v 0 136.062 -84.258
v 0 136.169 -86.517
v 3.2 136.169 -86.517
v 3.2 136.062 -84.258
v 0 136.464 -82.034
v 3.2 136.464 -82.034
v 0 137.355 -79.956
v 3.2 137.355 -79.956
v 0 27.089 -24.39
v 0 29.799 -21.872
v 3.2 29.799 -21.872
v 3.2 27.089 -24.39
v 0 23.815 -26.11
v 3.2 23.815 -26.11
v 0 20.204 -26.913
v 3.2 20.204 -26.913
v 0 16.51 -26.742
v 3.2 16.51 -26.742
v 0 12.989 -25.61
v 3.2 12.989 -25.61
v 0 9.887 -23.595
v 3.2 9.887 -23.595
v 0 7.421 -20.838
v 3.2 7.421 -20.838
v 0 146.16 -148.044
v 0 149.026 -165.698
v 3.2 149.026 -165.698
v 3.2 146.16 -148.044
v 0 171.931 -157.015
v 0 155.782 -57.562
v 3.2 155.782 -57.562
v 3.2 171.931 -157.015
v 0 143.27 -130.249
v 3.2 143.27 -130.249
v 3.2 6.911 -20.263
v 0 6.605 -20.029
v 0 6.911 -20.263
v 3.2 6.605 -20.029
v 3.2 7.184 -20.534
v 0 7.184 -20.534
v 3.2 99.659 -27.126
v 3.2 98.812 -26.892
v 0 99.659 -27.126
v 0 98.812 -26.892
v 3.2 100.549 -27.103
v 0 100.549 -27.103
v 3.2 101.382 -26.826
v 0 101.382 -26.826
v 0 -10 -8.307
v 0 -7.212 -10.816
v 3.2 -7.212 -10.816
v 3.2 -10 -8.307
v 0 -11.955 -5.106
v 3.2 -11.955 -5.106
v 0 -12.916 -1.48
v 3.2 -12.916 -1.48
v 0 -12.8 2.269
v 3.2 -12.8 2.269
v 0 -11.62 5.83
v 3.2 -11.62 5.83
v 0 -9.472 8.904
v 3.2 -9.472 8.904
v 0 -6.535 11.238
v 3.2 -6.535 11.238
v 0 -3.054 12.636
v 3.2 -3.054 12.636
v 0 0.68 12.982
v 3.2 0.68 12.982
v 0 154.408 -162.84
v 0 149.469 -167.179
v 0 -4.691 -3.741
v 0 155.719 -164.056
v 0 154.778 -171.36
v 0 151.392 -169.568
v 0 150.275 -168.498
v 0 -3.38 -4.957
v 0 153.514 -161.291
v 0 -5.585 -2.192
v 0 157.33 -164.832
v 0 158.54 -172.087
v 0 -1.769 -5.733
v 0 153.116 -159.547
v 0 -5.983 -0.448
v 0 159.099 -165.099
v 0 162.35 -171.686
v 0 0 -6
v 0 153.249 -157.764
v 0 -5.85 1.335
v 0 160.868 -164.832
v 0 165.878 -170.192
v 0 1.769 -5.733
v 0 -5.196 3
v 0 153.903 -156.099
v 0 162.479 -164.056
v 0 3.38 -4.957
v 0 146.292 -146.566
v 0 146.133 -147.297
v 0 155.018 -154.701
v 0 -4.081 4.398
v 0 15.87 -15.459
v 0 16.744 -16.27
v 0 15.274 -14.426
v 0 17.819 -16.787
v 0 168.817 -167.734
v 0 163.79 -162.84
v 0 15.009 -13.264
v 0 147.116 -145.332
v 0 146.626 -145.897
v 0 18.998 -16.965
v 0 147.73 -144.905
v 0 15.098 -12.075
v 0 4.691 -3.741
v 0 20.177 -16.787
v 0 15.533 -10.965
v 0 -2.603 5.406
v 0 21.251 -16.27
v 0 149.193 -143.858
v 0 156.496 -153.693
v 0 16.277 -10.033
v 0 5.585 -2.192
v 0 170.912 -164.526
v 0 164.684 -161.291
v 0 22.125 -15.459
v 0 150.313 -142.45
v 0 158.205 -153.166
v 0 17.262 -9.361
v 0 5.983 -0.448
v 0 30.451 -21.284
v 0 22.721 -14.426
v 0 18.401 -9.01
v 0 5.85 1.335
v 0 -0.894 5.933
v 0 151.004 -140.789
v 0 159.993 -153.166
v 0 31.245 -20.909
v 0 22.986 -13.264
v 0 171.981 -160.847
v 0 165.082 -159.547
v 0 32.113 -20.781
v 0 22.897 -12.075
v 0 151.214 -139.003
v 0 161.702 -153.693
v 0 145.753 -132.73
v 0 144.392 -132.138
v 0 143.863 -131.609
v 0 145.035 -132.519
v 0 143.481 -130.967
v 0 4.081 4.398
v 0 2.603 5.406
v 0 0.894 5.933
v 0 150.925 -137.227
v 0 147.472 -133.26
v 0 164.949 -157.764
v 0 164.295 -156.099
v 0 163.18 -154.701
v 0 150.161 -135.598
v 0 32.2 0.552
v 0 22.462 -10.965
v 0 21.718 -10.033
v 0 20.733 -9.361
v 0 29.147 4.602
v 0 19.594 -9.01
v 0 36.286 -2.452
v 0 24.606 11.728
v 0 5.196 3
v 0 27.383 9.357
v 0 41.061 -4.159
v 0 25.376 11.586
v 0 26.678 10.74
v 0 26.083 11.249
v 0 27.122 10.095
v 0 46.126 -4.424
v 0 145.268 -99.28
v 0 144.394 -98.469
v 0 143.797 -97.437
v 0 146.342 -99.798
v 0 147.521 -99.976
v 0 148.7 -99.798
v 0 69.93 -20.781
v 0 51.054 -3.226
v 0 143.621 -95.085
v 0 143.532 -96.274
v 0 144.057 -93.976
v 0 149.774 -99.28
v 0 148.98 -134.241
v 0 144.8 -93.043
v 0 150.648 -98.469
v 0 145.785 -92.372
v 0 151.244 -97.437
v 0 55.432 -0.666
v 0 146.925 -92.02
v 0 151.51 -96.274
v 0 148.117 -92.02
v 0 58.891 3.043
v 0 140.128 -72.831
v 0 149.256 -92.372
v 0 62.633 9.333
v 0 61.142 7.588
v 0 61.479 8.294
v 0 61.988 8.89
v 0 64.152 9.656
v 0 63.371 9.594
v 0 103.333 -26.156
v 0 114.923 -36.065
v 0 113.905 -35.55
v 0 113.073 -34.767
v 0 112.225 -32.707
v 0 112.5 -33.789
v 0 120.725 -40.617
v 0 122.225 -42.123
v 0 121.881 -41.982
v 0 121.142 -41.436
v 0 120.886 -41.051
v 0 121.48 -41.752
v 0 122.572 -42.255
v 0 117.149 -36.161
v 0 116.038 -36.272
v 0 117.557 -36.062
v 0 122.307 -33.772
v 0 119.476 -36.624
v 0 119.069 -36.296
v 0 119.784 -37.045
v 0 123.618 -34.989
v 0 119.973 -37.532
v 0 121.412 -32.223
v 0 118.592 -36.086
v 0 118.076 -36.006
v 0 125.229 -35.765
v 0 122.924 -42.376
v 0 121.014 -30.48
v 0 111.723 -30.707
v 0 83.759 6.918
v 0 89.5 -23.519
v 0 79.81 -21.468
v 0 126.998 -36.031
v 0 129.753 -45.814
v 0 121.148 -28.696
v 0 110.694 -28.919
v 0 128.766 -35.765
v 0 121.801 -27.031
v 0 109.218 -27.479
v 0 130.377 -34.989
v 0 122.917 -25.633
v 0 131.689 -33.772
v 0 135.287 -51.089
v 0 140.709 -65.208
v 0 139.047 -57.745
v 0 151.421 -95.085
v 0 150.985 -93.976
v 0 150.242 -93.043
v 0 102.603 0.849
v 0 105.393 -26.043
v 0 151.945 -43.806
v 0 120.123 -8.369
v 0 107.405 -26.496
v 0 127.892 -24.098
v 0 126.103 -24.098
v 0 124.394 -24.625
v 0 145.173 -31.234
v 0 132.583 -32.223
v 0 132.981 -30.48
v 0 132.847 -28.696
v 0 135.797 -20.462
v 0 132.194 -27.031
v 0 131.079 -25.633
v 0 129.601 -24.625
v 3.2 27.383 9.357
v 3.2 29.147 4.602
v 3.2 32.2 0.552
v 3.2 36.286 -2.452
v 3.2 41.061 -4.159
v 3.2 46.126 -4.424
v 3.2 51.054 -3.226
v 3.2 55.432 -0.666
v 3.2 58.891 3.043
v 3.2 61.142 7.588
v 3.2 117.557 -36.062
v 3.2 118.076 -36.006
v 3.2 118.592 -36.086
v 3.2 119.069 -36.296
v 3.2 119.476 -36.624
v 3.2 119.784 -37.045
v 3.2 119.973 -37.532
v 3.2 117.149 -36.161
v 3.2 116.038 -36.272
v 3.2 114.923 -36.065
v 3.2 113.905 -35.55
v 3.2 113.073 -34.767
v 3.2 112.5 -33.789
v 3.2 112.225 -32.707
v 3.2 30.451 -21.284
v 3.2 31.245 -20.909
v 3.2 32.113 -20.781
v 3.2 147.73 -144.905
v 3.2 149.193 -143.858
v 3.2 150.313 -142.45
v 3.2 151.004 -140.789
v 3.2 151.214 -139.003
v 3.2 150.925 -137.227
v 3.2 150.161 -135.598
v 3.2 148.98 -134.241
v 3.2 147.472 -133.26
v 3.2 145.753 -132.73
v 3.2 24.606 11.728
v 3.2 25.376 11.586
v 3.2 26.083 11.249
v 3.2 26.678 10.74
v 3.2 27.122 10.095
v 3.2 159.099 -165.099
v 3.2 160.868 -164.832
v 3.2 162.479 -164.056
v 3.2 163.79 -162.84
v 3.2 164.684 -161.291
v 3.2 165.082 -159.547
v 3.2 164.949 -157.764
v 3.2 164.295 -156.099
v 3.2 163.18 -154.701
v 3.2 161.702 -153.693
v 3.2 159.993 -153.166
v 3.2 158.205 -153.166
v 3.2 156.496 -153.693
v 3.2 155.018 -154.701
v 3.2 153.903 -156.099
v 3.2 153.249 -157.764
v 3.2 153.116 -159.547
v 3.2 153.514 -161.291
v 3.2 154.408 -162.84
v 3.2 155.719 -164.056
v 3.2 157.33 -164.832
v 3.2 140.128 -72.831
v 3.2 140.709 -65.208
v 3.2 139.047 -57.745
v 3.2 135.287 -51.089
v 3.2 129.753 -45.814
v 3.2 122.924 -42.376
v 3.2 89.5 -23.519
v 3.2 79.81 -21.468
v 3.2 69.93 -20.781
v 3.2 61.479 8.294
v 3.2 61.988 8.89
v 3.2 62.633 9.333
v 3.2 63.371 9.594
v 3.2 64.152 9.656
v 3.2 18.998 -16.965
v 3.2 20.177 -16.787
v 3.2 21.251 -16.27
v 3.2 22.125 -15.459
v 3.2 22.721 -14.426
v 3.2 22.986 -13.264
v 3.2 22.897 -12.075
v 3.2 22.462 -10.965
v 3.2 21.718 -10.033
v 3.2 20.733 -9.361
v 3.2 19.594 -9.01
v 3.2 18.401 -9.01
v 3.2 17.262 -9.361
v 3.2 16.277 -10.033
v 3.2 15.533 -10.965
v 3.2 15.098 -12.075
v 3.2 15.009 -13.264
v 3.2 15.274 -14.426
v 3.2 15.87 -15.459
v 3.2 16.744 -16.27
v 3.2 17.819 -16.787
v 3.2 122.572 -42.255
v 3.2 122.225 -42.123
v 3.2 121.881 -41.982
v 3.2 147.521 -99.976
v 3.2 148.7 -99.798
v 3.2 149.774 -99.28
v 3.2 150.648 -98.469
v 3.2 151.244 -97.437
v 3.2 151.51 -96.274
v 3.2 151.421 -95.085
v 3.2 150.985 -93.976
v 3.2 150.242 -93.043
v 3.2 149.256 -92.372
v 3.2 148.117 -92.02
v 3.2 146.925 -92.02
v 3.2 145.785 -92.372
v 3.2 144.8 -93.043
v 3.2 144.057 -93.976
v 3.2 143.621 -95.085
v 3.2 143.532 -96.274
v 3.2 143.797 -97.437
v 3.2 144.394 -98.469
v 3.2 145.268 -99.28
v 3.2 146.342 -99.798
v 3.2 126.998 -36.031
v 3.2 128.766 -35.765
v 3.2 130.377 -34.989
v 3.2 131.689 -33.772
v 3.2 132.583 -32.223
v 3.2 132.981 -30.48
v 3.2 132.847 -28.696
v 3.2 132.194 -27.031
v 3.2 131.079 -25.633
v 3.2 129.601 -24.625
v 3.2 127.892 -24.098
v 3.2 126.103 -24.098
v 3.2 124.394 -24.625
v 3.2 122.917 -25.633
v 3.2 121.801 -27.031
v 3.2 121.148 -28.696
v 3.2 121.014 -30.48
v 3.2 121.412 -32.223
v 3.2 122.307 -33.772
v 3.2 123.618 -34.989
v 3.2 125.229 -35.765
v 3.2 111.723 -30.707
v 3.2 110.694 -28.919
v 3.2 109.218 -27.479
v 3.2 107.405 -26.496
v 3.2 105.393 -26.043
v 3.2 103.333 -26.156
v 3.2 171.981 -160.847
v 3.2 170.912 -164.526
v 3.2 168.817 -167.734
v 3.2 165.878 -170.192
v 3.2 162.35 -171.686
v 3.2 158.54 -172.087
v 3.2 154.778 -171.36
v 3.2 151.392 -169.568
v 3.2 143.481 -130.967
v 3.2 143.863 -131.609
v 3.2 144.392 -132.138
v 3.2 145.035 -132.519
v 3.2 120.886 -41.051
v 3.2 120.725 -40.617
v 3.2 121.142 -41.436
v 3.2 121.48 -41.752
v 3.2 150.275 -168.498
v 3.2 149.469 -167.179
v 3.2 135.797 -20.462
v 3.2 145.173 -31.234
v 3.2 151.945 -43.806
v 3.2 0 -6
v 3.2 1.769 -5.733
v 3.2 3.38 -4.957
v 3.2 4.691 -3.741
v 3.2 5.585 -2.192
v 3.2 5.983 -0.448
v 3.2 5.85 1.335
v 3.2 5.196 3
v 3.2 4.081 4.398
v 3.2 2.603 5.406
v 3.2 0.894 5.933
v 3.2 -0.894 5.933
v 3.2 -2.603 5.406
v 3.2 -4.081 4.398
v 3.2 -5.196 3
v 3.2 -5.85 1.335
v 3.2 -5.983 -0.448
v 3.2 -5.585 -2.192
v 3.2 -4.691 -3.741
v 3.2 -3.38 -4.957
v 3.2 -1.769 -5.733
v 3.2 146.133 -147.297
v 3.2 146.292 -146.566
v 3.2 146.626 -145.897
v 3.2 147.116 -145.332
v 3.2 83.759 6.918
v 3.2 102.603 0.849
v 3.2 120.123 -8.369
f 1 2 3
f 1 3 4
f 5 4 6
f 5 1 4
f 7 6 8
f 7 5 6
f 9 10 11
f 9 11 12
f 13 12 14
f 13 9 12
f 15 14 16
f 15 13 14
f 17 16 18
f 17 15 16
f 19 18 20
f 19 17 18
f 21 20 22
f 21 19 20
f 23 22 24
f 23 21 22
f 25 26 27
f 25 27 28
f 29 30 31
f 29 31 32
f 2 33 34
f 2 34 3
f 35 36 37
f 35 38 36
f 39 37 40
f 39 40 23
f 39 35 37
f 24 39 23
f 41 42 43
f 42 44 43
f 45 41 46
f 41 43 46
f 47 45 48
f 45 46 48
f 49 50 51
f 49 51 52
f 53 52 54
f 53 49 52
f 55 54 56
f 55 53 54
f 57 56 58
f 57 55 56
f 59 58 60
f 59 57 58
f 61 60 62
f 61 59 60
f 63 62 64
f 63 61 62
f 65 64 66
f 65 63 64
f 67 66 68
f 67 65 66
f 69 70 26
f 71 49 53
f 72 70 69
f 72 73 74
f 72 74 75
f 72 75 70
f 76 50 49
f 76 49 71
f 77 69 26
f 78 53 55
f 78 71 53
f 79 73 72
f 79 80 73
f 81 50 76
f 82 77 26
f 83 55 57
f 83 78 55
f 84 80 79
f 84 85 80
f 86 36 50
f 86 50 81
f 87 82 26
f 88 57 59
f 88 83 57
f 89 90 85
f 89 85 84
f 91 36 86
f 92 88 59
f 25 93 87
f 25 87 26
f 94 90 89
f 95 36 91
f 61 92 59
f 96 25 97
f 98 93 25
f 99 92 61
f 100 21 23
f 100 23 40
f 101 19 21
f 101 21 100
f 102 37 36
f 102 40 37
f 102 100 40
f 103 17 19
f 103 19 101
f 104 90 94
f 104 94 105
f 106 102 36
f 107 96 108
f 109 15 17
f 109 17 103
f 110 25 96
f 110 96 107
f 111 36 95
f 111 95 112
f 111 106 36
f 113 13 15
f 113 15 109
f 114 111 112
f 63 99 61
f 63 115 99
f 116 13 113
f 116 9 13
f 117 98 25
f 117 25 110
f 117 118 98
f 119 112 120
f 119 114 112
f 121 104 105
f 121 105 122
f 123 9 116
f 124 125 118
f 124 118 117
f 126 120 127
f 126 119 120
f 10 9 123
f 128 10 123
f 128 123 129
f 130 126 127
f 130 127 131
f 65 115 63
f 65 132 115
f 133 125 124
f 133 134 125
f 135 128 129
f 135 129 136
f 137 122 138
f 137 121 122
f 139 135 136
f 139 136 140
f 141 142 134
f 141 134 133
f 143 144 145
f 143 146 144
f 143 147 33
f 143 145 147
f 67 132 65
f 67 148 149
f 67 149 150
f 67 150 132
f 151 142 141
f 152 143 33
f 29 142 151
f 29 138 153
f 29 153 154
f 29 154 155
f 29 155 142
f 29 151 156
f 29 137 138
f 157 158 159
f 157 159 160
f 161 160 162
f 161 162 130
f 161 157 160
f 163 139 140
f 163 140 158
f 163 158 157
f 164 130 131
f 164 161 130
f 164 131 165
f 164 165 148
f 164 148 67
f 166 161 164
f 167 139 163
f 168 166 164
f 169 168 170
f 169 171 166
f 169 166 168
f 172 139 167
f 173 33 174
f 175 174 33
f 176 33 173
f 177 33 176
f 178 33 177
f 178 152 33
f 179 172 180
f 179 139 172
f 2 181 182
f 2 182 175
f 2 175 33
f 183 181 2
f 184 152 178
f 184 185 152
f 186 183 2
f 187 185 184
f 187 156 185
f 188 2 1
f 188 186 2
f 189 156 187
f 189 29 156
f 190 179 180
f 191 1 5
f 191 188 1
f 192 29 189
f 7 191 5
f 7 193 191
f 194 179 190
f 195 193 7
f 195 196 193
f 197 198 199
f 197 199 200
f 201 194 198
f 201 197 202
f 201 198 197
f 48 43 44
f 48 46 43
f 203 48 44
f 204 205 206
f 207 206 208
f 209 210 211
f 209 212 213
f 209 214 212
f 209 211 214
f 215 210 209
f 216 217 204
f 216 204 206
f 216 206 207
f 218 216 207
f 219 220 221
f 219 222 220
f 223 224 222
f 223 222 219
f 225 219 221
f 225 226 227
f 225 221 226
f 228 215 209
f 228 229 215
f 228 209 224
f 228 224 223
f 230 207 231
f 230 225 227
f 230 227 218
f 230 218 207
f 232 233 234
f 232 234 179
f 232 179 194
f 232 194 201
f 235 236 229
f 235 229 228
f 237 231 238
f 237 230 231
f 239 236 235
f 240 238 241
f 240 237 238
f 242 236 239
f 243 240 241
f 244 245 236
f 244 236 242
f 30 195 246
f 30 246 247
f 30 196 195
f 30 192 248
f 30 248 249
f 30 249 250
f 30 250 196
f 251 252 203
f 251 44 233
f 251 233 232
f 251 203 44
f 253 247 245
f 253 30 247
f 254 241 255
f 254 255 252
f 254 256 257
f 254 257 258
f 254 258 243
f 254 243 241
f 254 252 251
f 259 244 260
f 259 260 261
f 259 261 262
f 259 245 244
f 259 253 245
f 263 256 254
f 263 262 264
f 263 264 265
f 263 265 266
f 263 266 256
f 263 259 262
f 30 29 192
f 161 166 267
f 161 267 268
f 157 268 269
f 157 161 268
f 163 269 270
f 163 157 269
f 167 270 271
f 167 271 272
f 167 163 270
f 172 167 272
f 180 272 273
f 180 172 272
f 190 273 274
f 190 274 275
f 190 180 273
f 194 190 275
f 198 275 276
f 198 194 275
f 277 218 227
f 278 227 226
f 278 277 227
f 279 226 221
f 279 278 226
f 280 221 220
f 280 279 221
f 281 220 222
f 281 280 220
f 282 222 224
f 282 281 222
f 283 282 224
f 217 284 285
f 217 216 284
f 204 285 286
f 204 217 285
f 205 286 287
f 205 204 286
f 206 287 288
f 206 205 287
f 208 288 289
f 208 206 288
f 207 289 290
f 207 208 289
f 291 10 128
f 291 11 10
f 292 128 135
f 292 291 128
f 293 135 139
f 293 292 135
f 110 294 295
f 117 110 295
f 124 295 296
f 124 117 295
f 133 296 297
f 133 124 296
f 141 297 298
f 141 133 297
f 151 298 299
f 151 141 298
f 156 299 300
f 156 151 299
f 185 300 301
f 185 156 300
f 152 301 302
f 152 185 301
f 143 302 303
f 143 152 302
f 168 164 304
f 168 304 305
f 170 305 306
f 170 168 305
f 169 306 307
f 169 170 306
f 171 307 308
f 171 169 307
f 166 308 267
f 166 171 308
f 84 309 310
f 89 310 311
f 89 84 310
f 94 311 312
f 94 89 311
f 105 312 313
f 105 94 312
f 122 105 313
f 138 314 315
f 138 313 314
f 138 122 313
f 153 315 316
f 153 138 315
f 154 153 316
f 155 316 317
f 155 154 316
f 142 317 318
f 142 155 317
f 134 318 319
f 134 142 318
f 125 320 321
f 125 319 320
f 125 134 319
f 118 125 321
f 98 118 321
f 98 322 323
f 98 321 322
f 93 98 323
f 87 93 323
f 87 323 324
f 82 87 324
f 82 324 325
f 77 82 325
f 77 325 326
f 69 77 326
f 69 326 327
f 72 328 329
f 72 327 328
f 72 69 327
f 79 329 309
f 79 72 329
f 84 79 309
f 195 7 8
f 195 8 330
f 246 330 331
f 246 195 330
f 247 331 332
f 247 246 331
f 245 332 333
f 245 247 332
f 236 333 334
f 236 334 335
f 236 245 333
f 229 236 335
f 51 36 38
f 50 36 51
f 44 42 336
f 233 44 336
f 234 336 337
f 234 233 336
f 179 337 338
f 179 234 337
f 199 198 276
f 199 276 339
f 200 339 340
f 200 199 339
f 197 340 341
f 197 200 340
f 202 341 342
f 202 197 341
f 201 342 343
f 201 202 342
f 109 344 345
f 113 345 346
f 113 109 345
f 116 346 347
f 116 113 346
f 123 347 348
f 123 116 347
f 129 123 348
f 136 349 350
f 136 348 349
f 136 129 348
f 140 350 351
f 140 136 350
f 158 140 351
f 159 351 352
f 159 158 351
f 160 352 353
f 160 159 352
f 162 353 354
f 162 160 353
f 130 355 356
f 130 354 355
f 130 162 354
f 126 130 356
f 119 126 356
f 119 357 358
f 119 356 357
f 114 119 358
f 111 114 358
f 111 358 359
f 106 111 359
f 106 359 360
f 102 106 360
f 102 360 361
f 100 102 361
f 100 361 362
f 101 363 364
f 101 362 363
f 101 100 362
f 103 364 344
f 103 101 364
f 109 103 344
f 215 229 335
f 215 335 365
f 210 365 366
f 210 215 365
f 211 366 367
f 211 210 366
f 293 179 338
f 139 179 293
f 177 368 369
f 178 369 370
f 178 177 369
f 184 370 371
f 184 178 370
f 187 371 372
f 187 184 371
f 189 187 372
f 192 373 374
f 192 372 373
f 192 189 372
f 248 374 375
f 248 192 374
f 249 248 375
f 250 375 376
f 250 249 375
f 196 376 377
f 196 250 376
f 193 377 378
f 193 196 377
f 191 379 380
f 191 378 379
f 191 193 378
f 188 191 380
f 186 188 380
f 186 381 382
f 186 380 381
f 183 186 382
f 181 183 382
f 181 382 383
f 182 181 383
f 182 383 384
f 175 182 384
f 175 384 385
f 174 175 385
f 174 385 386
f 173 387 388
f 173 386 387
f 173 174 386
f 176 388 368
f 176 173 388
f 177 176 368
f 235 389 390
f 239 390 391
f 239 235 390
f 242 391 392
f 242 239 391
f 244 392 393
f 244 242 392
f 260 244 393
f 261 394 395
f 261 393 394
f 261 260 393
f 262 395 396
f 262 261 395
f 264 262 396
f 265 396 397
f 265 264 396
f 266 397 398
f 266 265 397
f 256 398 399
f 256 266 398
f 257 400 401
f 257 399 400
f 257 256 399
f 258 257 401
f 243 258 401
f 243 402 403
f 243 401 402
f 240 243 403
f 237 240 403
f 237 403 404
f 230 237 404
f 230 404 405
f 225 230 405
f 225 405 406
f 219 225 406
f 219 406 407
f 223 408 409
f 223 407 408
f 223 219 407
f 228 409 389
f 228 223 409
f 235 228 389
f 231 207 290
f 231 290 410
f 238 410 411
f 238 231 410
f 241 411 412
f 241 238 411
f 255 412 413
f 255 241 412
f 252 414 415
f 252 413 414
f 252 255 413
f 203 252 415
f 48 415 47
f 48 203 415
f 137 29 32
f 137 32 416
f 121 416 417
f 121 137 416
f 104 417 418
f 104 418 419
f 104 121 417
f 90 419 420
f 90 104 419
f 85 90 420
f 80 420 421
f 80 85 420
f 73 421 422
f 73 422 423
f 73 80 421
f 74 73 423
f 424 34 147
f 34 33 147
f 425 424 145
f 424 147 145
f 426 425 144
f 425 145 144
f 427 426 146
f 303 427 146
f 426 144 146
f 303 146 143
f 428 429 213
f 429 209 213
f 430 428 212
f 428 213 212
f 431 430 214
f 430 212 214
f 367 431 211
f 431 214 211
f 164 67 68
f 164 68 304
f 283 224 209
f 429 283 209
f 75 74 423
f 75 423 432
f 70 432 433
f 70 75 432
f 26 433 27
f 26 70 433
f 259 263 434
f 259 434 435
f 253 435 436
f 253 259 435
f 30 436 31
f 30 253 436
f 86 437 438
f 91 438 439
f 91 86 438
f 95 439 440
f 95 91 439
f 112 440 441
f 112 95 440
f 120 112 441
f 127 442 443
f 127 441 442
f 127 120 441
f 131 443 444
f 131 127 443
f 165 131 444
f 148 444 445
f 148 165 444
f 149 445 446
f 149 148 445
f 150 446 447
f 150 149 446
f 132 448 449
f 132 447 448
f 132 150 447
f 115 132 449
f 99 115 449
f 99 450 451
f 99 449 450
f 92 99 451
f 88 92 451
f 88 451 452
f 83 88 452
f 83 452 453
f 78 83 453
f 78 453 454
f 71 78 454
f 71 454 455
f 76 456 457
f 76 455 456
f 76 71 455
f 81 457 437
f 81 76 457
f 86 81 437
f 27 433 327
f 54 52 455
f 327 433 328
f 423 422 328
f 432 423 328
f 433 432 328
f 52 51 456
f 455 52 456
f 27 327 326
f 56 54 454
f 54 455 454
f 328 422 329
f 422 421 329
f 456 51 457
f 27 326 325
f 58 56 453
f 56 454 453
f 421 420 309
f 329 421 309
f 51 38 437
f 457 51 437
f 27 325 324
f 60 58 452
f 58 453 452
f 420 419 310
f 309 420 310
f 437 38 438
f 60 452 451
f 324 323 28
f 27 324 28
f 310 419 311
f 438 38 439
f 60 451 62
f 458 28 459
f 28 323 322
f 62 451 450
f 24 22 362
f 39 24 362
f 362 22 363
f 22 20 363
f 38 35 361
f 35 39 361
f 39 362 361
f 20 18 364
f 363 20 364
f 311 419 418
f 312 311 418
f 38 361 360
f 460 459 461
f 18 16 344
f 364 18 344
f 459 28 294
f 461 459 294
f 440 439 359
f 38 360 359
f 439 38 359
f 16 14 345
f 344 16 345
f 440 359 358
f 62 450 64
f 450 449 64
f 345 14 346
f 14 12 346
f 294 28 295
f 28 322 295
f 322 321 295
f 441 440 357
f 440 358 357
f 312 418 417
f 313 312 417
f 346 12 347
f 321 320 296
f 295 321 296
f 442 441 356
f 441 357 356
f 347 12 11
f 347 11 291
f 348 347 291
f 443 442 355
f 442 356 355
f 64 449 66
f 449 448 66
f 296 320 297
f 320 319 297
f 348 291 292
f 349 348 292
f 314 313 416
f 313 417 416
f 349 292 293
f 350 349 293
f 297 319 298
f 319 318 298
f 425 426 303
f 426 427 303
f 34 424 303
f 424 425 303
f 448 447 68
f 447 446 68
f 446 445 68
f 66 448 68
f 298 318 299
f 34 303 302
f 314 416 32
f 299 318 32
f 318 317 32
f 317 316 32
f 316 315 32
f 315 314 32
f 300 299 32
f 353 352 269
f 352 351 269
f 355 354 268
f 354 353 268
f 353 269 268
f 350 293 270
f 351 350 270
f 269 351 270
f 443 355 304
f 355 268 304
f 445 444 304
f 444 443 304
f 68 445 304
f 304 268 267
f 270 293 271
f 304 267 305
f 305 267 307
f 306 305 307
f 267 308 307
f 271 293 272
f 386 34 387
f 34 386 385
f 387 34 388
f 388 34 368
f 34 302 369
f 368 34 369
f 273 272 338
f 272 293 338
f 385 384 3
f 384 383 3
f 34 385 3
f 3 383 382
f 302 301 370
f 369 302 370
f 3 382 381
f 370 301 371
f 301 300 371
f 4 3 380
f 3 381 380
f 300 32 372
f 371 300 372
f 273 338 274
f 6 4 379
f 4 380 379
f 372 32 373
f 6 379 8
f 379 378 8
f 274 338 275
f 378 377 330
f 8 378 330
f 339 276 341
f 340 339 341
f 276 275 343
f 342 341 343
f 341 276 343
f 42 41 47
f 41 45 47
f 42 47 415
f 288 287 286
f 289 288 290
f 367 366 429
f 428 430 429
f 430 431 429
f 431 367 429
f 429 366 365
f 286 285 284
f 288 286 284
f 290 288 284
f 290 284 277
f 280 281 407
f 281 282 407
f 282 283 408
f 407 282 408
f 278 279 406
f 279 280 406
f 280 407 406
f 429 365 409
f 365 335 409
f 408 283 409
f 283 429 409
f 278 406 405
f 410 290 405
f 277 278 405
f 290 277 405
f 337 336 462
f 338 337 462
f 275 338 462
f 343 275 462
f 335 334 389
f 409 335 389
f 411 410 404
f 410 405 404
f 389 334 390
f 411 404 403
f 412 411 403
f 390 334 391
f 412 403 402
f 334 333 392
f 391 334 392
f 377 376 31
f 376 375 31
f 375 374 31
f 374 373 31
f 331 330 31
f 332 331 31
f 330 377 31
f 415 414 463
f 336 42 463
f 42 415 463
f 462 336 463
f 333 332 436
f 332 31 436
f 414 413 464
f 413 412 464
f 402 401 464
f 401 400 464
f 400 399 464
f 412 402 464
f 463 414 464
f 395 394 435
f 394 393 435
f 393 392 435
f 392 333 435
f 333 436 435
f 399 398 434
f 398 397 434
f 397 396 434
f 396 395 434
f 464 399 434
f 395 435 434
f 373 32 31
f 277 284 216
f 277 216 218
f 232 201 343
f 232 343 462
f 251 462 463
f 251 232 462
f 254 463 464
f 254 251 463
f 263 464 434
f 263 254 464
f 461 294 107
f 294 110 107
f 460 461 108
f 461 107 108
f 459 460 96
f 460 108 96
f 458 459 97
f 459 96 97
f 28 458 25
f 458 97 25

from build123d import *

# Parameters (mm, degrees)
EXTRUDE1_DEPTH            = 3.2
SKETCH5_R                 = 6
CHASSIS_MOUNT_HOLES_DEPTH = 244.405812041
SKETCH6_R                 = 4
ENGINE_MOUNT_HOLES_DEPTH  = 244.405812041
SKETCH7_R                 = 6.5
SKETCH7_R_2               = 7.5
BOSS_CLEARANCE_DEPTH      = 244.405812041
FILLET1_R                 = 3
FILLET2_R                 = 2
FILLET4_R                 = 4


with BuildPart() as part:
    # Sketch4 → Extrude1 (new body)
    with BuildSketch(Plane(origin=(0, 0, 0), x_dir=(0, 0, -1), z_dir=(1, 0, 0))):
        with BuildLine():
            Line((57.561676807, 155.782132528), (157.015436102, 171.930964589))
            ThreePointArc((157.015436102, 171.930964589), (170.191569786, 165.878071941), (169.567790519, 151.39156416))
            ThreePointArc((169.567790519, 151.39156416), (167.864843482, 149.829218431), (165.697709708, 149.026420829))
            Line((165.697709708, 149.026420829), (86.516546247, 136.169357202))
            ThreePointArc((86.516546247, 136.169357202), (83.134642067, 136.199619503), (79.956239663, 137.355452467))
            ThreePointArc((79.956239663, 137.355452467), (57.745458436, 139.047132616), (42.376364081, 122.923500175))
            ThreePointArc((42.376364081, 122.923500175), (41.240179336, 120.412740542), (39.600266647, 118.197900576))
            ThreePointArc((39.600266647, 118.197900576), (25.651951648, 95.833503084), (20.780663371, 69.92998369))
            Line((20.780663371, 69.92998369), (20.780663371, 30.61290747))
            ThreePointArc((20.780663371, 30.61290747), (26.962955948, 18.753205297), (20.37053182, 7.116486634))
            Line((20.37053182, 7.116486634), (10.815904153, -7.21222708))
            ThreePointArc((10.815904153, -7.21222708), (-4.092243171, -12.339106447), (-12.982184032, 0.680367435))
            Line((-12.982184032, 0.680367435), (-11.728287792, 24.606132992))
            ThreePointArc((-11.728287792, 24.606132992), (-11.013879957, 26.397161442), (-9.356926136, 27.383399496))
            ThreePointArc((-9.356926136, 27.383399496), (4.476016858, 43.584120766), (-7.587711328, 61.142029063))
            ThreePointArc((-7.587711328, 61.142029063), (-9.132498235, 62.296063238), (-9.655779017, 64.1519562))
            ThreePointArc((-9.655779017, 64.1519562), (-0.849075896, 102.602883239), (20.462203873, 135.797177398))
            ThreePointArc((20.462203873, 135.797177398), (37.331902598, 148.908426775), (57.561676807, 155.782132528))
        make_face()
    extrude(amount=EXTRUDE1_DEPTH)

    # Sketch5 → chassis mount holes (cut, through all)
    with BuildSketch(Plane(origin=(0, 0, 0), x_dir=(0, 0, -1), z_dir=(1, 0, 0))):
        Circle(SKETCH5_R)
        with Locations((159.099025767, 159.099025767)):
            Circle(SKETCH5_R)
        with Locations((30.03123526, 126.997538987)):
            Circle(SKETCH5_R)
    extrude(amount=CHASSIS_MOUNT_HOLES_DEPTH, mode=Mode.SUBTRACT)

    # Sketch6 → engine mount holes (cut, through all)
    with BuildSketch(Plane(origin=(0, 0, 0), x_dir=(0, 0, -1), z_dir=(1, 0, 0))):
        with Locations((12.965088215, 18.997538987)):
            Circle(SKETCH6_R)
        with Locations((95.975539476, 147.520941453)):
            Circle(SKETCH6_R)
    extrude(amount=ENGINE_MOUNT_HOLES_DEPTH, mode=Mode.SUBTRACT)

    # Sketch7 → boss clearance (cut, through all)
    with BuildSketch(Plane(origin=(0, 0, 0), x_dir=(0, 0, -1), z_dir=(1, 0, 0))):
        with Locations((139.146474391, 144.715156547)):
            Circle(SKETCH7_R)
        with Locations((33.517273096, 104.769234054)):
            Circle(SKETCH7_R_2)
        Polygon((35.588537275, 119.499655), (44.876445881, 121.763048067), (36.718478427, 114.862903962), align=None)
    extrude(amount=BOSS_CLEARANCE_DEPTH, mode=Mode.SUBTRACT)

    # Fillet1
    fillet1_edges = [part.edges().sort_by_distance(p)[0] for p in [
        (1.6, 30.61290747, -20.780663371),
        (1.6, 7.116486634, -20.37053182),
        (1.6, 143.673361714, -132.730504977),
        (1.6, 145.75695138, -145.562443806),
        (1.6, 100.236921904, -27.541643708),
    ]]
    fillet(fillet1_edges, radius=FILLET1_R)

    # Fillet2
    fillet2_edges = [part.edges().sort_by_distance(p)[0] for p in [
        (1.6, 120.949682485, -41.538773206),
        (1.6, 119.499655, -35.588537275),
    ]]
    fillet(fillet2_edges, radius=FILLET2_R)

    # Fillet4
    fillet4_edges = [part.edges().sort_by_distance(p)[0] for p in [
        (1.6, 114.862903962, -36.718478427),
    ]]
    fillet(fillet4_edges, radius=FILLET4_R)
    fillet4_2_edges = [part.edges().sort_by_distance(p)[0] for p in [
        (1.6, 112.183550135, -34.647723026),
    ]]
    fillet(fillet4_2_edges, radius=FILLET4_R - 0.0001)  # a hair under: the kernel refuses the full size


solid = part.part
